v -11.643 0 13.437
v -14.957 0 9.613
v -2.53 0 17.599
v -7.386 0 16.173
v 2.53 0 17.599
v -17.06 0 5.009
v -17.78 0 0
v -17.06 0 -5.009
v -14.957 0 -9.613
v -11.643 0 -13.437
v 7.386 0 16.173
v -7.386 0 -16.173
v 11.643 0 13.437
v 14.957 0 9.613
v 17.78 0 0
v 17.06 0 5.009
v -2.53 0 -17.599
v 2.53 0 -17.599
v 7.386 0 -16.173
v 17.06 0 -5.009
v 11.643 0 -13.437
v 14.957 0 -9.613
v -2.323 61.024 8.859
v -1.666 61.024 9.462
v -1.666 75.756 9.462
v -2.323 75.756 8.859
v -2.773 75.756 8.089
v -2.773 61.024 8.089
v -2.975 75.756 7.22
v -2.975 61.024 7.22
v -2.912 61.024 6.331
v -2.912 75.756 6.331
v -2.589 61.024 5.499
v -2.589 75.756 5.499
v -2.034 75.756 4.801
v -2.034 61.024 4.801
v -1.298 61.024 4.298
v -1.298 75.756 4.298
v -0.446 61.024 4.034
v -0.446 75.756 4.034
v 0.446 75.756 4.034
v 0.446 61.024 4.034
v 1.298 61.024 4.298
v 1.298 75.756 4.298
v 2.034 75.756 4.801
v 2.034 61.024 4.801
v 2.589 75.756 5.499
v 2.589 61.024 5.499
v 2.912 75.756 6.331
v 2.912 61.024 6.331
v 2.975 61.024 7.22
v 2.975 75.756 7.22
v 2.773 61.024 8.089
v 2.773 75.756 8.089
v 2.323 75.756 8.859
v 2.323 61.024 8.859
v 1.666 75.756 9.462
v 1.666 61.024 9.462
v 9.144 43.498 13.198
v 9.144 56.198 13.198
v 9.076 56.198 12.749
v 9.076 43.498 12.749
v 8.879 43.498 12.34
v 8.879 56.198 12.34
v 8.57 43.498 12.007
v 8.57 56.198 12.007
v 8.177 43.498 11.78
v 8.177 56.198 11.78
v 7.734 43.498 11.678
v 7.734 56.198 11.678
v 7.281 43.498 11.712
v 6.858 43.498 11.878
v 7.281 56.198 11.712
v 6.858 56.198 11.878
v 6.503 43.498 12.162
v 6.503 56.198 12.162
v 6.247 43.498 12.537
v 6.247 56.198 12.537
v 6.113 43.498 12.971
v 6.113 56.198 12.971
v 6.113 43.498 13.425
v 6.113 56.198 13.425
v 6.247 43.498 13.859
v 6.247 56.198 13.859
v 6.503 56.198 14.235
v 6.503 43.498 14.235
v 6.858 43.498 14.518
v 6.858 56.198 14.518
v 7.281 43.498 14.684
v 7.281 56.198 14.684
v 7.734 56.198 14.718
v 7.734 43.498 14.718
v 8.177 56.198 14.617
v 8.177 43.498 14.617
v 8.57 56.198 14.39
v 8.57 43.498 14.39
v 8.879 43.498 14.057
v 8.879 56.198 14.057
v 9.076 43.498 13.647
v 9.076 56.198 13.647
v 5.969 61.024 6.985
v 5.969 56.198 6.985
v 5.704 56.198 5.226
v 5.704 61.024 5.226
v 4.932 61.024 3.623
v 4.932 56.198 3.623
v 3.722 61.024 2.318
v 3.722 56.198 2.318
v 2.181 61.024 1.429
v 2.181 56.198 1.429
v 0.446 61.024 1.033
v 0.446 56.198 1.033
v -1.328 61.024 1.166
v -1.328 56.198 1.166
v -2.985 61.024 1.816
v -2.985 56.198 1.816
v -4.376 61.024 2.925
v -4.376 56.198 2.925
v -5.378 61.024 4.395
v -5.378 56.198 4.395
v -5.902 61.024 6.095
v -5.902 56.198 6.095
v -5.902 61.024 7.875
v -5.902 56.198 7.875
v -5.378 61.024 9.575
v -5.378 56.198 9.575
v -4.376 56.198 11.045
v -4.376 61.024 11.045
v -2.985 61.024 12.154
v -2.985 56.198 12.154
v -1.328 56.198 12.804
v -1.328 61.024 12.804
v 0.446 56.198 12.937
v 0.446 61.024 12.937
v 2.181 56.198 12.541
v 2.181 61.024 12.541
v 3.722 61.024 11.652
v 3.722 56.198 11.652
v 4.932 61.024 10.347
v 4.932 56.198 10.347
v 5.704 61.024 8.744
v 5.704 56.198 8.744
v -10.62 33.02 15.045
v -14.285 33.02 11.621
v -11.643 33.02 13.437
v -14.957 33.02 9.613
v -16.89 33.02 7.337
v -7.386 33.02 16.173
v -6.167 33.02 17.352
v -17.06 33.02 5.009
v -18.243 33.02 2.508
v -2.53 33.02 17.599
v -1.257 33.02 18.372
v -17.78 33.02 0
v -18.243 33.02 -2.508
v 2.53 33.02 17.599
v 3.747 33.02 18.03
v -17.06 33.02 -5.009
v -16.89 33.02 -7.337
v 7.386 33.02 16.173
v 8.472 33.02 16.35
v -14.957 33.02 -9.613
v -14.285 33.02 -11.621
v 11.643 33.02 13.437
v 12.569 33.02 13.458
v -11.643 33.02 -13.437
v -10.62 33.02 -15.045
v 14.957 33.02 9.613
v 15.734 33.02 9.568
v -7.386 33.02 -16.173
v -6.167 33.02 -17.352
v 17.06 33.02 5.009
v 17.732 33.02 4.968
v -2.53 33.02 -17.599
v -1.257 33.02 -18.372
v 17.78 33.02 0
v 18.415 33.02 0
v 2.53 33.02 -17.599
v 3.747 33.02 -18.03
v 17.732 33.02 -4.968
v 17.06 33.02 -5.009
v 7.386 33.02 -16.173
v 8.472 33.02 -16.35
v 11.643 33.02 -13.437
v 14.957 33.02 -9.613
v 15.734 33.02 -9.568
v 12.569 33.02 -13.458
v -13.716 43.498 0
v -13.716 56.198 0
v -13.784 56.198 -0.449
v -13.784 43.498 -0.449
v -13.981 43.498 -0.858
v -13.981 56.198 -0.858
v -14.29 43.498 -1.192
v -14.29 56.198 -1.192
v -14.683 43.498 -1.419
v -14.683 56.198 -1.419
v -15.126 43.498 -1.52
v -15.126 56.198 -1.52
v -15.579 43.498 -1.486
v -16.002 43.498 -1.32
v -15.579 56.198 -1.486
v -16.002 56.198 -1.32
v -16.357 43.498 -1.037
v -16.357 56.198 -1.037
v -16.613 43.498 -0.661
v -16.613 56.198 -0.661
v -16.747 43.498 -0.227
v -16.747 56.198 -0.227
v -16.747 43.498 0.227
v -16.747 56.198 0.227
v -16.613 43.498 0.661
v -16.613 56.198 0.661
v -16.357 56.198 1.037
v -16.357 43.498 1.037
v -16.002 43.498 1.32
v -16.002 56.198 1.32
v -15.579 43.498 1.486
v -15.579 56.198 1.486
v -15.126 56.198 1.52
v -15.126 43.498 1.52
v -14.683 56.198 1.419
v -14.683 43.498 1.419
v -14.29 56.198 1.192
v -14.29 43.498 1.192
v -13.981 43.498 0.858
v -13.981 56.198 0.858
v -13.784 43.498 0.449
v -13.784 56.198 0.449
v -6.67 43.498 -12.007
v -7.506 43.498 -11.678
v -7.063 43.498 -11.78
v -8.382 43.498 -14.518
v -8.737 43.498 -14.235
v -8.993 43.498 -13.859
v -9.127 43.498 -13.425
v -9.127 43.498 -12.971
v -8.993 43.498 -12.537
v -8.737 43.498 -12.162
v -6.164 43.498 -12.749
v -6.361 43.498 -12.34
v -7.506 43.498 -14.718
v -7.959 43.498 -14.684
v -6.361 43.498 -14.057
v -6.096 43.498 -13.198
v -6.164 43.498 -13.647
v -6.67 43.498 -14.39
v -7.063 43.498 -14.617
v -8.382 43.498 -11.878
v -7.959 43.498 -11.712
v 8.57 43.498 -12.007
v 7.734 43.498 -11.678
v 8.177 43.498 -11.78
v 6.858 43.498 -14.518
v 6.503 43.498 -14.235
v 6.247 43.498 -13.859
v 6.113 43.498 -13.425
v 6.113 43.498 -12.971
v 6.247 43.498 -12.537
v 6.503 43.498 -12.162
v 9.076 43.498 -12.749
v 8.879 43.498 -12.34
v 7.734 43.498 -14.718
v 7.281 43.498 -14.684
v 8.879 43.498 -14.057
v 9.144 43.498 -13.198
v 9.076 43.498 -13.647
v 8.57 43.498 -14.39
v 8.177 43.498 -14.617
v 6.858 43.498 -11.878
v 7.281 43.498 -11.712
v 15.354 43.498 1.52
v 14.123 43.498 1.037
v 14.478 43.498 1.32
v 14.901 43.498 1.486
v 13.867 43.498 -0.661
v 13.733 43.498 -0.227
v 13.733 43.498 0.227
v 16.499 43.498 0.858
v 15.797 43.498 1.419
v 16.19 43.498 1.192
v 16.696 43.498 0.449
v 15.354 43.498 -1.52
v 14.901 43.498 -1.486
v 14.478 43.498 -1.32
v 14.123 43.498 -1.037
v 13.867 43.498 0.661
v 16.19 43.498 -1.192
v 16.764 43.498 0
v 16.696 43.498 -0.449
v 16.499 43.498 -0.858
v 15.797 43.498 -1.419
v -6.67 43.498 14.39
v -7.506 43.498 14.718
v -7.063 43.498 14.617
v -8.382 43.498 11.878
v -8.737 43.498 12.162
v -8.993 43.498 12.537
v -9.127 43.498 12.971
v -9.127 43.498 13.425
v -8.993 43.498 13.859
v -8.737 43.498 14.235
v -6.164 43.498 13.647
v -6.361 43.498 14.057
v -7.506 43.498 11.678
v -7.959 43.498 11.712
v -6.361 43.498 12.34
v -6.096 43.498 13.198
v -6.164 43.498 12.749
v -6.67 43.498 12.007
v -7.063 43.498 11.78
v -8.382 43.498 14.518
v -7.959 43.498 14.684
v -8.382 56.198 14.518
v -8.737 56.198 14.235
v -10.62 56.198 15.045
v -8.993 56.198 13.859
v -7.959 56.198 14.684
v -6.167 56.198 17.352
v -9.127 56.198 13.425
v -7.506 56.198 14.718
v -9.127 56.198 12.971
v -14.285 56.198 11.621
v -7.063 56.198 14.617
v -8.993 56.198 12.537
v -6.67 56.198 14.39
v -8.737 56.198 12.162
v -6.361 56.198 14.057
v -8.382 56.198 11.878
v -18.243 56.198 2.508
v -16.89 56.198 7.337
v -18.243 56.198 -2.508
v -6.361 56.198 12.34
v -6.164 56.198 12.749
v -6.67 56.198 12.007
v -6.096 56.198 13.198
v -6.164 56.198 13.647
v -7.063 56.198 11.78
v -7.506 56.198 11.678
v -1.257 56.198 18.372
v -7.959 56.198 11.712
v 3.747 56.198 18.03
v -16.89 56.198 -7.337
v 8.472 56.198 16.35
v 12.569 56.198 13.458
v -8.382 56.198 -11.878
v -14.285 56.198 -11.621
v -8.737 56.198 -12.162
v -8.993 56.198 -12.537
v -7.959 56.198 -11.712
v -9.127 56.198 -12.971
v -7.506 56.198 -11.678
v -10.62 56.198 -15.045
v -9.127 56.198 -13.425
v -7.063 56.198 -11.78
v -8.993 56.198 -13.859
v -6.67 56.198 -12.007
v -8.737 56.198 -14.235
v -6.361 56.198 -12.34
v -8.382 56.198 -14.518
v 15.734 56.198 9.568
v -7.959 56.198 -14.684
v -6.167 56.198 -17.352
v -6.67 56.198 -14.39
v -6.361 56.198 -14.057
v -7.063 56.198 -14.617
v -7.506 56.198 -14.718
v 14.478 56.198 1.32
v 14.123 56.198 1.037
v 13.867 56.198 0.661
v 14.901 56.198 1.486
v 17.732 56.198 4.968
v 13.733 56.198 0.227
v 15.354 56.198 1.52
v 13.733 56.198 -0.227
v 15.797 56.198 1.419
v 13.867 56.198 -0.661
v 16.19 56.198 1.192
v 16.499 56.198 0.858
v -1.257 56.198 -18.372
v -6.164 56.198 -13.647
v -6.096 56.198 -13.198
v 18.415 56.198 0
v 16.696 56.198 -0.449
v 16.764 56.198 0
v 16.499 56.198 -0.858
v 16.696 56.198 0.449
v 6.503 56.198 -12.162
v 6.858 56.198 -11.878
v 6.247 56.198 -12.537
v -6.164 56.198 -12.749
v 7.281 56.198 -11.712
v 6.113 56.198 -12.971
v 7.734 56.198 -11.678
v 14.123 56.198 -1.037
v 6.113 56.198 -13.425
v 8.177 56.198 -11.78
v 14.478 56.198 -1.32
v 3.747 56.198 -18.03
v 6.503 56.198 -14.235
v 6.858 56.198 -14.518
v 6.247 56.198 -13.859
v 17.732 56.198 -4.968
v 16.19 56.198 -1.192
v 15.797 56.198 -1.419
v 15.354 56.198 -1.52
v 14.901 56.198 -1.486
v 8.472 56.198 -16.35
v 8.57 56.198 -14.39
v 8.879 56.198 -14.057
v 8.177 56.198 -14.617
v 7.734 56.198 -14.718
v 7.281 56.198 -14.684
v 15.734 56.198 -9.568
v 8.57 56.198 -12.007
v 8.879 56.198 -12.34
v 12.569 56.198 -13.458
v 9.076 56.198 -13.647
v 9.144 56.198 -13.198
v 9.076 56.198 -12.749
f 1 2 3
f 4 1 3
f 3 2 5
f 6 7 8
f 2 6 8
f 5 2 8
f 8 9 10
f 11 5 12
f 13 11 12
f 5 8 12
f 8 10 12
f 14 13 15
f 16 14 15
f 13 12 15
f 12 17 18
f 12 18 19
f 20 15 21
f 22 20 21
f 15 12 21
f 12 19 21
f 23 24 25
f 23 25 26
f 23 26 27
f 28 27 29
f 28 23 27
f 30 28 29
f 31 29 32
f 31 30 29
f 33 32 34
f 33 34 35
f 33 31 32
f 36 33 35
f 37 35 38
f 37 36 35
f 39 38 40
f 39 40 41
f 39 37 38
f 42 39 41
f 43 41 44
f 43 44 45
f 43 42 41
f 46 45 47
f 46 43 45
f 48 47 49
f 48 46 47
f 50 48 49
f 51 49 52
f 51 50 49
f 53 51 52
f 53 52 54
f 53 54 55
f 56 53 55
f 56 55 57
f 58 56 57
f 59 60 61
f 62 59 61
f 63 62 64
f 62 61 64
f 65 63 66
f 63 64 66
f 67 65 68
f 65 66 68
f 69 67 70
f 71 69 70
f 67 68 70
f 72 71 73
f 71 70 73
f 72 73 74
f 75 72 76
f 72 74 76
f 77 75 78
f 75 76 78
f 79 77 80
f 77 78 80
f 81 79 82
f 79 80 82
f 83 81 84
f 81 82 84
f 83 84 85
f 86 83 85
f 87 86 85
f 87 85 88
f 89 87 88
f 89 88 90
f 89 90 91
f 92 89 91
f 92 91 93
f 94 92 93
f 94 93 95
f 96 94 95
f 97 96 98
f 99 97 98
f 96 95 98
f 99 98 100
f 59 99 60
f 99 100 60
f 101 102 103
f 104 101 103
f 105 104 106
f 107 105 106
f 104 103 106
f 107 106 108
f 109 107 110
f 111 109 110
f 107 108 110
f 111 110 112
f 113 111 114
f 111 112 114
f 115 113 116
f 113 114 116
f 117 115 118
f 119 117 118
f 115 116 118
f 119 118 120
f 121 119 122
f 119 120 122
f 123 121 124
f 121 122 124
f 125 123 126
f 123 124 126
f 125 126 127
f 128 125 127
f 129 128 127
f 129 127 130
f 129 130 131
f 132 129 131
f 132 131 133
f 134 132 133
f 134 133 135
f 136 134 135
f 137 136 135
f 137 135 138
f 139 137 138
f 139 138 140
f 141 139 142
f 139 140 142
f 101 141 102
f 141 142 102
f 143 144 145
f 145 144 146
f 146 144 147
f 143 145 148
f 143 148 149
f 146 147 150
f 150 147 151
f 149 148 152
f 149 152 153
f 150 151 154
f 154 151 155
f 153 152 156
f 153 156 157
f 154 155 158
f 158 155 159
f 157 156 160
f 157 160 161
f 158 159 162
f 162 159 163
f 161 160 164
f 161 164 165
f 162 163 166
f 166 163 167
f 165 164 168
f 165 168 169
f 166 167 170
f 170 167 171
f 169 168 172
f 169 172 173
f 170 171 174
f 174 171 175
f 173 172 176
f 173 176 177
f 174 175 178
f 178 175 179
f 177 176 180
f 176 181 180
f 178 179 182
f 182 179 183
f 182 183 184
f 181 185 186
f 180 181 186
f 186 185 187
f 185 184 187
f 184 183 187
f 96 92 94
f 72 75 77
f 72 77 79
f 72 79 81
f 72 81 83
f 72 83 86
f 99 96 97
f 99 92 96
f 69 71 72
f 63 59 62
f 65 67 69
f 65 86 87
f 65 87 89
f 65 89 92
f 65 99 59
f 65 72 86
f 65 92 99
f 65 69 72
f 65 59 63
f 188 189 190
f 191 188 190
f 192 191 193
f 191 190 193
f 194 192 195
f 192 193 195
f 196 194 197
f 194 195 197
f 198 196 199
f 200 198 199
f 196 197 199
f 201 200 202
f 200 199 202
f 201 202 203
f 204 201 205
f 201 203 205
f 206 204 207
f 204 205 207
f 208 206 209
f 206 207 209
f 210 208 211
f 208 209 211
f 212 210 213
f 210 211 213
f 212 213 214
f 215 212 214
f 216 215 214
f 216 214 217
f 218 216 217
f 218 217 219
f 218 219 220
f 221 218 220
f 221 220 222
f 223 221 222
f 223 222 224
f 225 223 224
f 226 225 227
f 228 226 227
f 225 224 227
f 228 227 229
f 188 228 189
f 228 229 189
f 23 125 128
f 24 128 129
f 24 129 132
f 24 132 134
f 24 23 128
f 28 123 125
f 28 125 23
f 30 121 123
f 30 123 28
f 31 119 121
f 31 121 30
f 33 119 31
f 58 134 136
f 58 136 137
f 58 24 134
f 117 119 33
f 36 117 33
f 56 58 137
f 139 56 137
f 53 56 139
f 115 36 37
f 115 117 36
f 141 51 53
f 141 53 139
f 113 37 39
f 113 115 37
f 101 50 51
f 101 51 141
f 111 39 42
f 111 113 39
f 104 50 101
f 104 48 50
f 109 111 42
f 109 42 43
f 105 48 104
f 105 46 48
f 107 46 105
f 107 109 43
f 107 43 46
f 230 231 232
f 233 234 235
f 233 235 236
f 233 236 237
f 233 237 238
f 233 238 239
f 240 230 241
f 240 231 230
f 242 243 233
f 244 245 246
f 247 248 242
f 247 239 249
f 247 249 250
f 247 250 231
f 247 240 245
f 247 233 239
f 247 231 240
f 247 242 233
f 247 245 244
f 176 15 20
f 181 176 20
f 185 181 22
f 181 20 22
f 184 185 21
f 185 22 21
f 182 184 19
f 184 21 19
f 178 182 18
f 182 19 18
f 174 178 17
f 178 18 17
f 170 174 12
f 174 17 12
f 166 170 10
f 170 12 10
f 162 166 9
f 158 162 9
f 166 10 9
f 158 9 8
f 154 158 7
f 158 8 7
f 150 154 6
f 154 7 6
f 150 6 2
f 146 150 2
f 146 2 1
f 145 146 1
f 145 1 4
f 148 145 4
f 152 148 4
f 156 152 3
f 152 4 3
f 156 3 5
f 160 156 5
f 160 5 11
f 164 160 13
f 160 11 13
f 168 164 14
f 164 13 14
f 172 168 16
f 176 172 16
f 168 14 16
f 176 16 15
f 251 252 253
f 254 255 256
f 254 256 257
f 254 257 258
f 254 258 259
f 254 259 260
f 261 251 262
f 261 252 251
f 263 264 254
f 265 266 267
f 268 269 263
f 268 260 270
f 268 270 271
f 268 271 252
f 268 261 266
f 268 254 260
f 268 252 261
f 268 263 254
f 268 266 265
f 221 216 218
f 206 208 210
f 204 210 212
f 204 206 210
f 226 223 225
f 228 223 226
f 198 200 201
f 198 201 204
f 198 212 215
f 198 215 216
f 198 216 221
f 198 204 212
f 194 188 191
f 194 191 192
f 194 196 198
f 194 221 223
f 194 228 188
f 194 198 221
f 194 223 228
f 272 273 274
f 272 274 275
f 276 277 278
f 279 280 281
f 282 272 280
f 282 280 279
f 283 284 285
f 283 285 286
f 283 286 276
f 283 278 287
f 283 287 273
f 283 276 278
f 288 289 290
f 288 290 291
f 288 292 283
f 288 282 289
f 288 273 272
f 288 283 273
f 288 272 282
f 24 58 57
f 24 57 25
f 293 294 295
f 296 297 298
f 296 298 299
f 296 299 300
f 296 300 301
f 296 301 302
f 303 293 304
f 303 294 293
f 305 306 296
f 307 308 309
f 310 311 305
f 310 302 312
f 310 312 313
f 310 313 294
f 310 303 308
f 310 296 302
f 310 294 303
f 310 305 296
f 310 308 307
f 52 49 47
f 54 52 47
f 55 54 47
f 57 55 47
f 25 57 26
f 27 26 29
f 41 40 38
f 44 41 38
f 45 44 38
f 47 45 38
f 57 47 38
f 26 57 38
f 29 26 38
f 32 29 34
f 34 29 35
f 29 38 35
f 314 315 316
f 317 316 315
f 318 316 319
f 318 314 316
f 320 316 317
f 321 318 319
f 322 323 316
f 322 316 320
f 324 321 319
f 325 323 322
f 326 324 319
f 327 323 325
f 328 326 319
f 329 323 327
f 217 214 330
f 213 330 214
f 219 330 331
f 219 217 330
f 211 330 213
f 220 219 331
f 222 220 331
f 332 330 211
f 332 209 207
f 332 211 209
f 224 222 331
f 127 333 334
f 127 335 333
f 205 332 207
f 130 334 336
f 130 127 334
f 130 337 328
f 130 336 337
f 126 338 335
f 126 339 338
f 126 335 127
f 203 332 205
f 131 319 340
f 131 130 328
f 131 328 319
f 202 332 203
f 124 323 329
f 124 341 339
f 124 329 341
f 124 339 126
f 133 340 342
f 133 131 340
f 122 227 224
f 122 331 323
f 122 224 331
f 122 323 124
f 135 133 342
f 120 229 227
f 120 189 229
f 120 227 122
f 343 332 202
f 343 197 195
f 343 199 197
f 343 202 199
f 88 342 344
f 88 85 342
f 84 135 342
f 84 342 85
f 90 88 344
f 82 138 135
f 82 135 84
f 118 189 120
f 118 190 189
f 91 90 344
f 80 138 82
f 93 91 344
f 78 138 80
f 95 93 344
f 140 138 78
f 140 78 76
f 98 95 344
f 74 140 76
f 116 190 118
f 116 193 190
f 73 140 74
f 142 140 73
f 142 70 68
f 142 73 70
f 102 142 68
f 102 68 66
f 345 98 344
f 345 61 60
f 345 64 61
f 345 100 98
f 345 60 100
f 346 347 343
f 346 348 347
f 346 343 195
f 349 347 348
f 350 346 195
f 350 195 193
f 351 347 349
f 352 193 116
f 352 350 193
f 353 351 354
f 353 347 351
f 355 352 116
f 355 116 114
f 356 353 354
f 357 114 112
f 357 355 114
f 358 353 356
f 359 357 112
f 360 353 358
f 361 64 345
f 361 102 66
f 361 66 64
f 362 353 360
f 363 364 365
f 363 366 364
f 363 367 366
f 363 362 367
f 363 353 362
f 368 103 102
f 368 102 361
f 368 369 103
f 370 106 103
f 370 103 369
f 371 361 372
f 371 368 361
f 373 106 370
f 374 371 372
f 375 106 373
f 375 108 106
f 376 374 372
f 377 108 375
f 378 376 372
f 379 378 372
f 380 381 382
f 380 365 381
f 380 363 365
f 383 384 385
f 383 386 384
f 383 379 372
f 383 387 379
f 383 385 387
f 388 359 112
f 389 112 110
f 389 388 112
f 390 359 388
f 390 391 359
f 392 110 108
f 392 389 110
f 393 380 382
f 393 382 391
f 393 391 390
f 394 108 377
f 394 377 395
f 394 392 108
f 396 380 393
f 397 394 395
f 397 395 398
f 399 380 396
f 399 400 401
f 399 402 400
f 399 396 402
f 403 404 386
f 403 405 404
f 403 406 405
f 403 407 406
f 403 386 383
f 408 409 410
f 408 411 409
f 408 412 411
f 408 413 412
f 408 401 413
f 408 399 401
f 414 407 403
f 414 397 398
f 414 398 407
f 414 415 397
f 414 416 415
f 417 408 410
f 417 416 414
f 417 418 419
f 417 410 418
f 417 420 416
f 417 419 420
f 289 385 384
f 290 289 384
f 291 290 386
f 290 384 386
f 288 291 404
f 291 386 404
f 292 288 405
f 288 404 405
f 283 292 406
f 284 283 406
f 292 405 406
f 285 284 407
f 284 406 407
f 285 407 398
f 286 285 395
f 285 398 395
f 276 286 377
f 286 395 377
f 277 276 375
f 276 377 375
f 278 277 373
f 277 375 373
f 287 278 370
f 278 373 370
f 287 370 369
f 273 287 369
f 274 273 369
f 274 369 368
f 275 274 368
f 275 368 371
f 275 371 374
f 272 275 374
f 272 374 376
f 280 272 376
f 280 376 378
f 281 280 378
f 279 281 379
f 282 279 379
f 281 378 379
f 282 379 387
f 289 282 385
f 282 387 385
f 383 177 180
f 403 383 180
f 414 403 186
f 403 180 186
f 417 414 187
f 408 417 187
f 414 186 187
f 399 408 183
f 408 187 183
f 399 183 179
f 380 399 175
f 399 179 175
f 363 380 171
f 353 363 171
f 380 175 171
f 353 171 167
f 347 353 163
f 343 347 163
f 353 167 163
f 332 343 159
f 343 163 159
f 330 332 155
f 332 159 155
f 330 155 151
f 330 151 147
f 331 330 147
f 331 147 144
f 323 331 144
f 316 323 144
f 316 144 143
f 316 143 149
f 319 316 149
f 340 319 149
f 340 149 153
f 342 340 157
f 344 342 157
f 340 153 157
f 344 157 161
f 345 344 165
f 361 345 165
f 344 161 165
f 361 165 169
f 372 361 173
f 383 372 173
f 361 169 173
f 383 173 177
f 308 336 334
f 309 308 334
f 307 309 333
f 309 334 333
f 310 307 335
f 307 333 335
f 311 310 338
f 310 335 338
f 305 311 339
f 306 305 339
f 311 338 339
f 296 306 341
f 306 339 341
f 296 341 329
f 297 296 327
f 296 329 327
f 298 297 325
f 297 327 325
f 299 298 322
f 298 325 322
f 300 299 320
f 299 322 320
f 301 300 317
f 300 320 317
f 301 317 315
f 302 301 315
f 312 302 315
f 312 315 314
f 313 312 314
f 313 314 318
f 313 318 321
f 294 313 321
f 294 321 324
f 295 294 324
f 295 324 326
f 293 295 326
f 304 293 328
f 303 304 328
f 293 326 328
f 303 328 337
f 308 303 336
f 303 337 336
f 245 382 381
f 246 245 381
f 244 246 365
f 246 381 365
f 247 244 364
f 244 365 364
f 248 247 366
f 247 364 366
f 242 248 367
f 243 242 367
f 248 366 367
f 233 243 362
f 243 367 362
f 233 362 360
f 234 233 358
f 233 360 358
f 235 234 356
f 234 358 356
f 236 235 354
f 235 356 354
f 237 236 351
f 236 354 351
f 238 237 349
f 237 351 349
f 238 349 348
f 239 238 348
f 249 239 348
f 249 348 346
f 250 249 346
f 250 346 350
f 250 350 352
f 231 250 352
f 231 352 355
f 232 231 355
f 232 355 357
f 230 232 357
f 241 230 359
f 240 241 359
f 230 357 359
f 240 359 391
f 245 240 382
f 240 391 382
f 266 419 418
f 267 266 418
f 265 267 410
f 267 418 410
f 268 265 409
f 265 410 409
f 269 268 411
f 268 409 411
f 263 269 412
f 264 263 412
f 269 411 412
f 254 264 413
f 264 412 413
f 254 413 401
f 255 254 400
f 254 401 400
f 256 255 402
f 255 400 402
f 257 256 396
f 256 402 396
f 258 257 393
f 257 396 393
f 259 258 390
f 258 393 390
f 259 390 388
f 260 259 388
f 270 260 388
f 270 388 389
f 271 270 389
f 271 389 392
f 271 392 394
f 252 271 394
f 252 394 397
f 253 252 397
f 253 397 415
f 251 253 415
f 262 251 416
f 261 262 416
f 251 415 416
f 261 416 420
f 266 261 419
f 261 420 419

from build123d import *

# Parameters (mm, degrees)
SKETCH1_R           = 17.78
BOSS_EXTRUDE1_DEPTH = 33.02
SKETCH2_R           = 18.415
BOSS_EXTRUDE2_DEPTH = 23.1775
SKETCH3_R           = 1.524
CUT_EXTRUDE1_DEPTH  = 12.7
SKETCH4_R           = 5.969
BOSS_EXTRUDE3_DEPTH = 4.826
BOSS_EXTRUDE4_DEPTH = 14.732


with BuildPart() as part:
    # Sketch1 → Boss-Extrude1 (new body)
    with BuildSketch(Plane(origin=(0, 0, 0), x_dir=(1, 0, 0), z_dir=(0, 1, 0))):
        Circle(SKETCH1_R)
    extrude(amount=BOSS_EXTRUDE1_DEPTH)

    # Sketch2 → Boss-Extrude2 (add)
    with BuildSketch(Plane(origin=(0, 33.02, 0), x_dir=(1, 0, 0), z_dir=(0, 1, 0))):
        Circle(SKETCH2_R)
    extrude(amount=BOSS_EXTRUDE2_DEPTH)

    # Sketch3 → Cut-Extrude1 (cut)
    with BuildSketch(Plane(origin=(0, 56.1975, 0), x_dir=(1, 0, 0), z_dir=(0, 1, 0))):
        with Locations((15.24, 0)):
            Circle(SKETCH3_R)
        with Locations((7.62, -13.198227154)):
            Circle(SKETCH3_R)
        with Locations((-7.62, -13.198227154)):
            Circle(SKETCH3_R)
        with Locations((-15.24, 0)):
            Circle(SKETCH3_R)
        with Locations((-7.62, 13.198227154)):
            Circle(SKETCH3_R)
        with Locations((7.62, 13.198227154)):
            Circle(SKETCH3_R)
    extrude(amount=-CUT_EXTRUDE1_DEPTH, mode=Mode.SUBTRACT)

    # Sketch4 → Boss-Extrude3 (add)
    with BuildSketch(Plane(origin=(0, 56.1975, 0), x_dir=(1, 0, 0), z_dir=(0, 1, 0))):
        with Locations((0, -6.985)):
            Circle(SKETCH4_R)
    extrude(amount=BOSS_EXTRUDE3_DEPTH)

    # Sketch5 → Boss-Extrude4 (add)
    with BuildSketch(Plane(origin=(0, 61.0235, 0), x_dir=(1, 0, 0), z_dir=(0, 1, 0))):
        with BuildLine():
            Line((1.665589385, -9.4615), (-1.665589385, -9.4615))
            ThreePointArc((-1.665589385, -9.4615), (0, -4.0005), (1.665589385, -9.4615))
        make_face()
    extrude(amount=BOSS_EXTRUDE4_DEPTH)


solid = part.part
